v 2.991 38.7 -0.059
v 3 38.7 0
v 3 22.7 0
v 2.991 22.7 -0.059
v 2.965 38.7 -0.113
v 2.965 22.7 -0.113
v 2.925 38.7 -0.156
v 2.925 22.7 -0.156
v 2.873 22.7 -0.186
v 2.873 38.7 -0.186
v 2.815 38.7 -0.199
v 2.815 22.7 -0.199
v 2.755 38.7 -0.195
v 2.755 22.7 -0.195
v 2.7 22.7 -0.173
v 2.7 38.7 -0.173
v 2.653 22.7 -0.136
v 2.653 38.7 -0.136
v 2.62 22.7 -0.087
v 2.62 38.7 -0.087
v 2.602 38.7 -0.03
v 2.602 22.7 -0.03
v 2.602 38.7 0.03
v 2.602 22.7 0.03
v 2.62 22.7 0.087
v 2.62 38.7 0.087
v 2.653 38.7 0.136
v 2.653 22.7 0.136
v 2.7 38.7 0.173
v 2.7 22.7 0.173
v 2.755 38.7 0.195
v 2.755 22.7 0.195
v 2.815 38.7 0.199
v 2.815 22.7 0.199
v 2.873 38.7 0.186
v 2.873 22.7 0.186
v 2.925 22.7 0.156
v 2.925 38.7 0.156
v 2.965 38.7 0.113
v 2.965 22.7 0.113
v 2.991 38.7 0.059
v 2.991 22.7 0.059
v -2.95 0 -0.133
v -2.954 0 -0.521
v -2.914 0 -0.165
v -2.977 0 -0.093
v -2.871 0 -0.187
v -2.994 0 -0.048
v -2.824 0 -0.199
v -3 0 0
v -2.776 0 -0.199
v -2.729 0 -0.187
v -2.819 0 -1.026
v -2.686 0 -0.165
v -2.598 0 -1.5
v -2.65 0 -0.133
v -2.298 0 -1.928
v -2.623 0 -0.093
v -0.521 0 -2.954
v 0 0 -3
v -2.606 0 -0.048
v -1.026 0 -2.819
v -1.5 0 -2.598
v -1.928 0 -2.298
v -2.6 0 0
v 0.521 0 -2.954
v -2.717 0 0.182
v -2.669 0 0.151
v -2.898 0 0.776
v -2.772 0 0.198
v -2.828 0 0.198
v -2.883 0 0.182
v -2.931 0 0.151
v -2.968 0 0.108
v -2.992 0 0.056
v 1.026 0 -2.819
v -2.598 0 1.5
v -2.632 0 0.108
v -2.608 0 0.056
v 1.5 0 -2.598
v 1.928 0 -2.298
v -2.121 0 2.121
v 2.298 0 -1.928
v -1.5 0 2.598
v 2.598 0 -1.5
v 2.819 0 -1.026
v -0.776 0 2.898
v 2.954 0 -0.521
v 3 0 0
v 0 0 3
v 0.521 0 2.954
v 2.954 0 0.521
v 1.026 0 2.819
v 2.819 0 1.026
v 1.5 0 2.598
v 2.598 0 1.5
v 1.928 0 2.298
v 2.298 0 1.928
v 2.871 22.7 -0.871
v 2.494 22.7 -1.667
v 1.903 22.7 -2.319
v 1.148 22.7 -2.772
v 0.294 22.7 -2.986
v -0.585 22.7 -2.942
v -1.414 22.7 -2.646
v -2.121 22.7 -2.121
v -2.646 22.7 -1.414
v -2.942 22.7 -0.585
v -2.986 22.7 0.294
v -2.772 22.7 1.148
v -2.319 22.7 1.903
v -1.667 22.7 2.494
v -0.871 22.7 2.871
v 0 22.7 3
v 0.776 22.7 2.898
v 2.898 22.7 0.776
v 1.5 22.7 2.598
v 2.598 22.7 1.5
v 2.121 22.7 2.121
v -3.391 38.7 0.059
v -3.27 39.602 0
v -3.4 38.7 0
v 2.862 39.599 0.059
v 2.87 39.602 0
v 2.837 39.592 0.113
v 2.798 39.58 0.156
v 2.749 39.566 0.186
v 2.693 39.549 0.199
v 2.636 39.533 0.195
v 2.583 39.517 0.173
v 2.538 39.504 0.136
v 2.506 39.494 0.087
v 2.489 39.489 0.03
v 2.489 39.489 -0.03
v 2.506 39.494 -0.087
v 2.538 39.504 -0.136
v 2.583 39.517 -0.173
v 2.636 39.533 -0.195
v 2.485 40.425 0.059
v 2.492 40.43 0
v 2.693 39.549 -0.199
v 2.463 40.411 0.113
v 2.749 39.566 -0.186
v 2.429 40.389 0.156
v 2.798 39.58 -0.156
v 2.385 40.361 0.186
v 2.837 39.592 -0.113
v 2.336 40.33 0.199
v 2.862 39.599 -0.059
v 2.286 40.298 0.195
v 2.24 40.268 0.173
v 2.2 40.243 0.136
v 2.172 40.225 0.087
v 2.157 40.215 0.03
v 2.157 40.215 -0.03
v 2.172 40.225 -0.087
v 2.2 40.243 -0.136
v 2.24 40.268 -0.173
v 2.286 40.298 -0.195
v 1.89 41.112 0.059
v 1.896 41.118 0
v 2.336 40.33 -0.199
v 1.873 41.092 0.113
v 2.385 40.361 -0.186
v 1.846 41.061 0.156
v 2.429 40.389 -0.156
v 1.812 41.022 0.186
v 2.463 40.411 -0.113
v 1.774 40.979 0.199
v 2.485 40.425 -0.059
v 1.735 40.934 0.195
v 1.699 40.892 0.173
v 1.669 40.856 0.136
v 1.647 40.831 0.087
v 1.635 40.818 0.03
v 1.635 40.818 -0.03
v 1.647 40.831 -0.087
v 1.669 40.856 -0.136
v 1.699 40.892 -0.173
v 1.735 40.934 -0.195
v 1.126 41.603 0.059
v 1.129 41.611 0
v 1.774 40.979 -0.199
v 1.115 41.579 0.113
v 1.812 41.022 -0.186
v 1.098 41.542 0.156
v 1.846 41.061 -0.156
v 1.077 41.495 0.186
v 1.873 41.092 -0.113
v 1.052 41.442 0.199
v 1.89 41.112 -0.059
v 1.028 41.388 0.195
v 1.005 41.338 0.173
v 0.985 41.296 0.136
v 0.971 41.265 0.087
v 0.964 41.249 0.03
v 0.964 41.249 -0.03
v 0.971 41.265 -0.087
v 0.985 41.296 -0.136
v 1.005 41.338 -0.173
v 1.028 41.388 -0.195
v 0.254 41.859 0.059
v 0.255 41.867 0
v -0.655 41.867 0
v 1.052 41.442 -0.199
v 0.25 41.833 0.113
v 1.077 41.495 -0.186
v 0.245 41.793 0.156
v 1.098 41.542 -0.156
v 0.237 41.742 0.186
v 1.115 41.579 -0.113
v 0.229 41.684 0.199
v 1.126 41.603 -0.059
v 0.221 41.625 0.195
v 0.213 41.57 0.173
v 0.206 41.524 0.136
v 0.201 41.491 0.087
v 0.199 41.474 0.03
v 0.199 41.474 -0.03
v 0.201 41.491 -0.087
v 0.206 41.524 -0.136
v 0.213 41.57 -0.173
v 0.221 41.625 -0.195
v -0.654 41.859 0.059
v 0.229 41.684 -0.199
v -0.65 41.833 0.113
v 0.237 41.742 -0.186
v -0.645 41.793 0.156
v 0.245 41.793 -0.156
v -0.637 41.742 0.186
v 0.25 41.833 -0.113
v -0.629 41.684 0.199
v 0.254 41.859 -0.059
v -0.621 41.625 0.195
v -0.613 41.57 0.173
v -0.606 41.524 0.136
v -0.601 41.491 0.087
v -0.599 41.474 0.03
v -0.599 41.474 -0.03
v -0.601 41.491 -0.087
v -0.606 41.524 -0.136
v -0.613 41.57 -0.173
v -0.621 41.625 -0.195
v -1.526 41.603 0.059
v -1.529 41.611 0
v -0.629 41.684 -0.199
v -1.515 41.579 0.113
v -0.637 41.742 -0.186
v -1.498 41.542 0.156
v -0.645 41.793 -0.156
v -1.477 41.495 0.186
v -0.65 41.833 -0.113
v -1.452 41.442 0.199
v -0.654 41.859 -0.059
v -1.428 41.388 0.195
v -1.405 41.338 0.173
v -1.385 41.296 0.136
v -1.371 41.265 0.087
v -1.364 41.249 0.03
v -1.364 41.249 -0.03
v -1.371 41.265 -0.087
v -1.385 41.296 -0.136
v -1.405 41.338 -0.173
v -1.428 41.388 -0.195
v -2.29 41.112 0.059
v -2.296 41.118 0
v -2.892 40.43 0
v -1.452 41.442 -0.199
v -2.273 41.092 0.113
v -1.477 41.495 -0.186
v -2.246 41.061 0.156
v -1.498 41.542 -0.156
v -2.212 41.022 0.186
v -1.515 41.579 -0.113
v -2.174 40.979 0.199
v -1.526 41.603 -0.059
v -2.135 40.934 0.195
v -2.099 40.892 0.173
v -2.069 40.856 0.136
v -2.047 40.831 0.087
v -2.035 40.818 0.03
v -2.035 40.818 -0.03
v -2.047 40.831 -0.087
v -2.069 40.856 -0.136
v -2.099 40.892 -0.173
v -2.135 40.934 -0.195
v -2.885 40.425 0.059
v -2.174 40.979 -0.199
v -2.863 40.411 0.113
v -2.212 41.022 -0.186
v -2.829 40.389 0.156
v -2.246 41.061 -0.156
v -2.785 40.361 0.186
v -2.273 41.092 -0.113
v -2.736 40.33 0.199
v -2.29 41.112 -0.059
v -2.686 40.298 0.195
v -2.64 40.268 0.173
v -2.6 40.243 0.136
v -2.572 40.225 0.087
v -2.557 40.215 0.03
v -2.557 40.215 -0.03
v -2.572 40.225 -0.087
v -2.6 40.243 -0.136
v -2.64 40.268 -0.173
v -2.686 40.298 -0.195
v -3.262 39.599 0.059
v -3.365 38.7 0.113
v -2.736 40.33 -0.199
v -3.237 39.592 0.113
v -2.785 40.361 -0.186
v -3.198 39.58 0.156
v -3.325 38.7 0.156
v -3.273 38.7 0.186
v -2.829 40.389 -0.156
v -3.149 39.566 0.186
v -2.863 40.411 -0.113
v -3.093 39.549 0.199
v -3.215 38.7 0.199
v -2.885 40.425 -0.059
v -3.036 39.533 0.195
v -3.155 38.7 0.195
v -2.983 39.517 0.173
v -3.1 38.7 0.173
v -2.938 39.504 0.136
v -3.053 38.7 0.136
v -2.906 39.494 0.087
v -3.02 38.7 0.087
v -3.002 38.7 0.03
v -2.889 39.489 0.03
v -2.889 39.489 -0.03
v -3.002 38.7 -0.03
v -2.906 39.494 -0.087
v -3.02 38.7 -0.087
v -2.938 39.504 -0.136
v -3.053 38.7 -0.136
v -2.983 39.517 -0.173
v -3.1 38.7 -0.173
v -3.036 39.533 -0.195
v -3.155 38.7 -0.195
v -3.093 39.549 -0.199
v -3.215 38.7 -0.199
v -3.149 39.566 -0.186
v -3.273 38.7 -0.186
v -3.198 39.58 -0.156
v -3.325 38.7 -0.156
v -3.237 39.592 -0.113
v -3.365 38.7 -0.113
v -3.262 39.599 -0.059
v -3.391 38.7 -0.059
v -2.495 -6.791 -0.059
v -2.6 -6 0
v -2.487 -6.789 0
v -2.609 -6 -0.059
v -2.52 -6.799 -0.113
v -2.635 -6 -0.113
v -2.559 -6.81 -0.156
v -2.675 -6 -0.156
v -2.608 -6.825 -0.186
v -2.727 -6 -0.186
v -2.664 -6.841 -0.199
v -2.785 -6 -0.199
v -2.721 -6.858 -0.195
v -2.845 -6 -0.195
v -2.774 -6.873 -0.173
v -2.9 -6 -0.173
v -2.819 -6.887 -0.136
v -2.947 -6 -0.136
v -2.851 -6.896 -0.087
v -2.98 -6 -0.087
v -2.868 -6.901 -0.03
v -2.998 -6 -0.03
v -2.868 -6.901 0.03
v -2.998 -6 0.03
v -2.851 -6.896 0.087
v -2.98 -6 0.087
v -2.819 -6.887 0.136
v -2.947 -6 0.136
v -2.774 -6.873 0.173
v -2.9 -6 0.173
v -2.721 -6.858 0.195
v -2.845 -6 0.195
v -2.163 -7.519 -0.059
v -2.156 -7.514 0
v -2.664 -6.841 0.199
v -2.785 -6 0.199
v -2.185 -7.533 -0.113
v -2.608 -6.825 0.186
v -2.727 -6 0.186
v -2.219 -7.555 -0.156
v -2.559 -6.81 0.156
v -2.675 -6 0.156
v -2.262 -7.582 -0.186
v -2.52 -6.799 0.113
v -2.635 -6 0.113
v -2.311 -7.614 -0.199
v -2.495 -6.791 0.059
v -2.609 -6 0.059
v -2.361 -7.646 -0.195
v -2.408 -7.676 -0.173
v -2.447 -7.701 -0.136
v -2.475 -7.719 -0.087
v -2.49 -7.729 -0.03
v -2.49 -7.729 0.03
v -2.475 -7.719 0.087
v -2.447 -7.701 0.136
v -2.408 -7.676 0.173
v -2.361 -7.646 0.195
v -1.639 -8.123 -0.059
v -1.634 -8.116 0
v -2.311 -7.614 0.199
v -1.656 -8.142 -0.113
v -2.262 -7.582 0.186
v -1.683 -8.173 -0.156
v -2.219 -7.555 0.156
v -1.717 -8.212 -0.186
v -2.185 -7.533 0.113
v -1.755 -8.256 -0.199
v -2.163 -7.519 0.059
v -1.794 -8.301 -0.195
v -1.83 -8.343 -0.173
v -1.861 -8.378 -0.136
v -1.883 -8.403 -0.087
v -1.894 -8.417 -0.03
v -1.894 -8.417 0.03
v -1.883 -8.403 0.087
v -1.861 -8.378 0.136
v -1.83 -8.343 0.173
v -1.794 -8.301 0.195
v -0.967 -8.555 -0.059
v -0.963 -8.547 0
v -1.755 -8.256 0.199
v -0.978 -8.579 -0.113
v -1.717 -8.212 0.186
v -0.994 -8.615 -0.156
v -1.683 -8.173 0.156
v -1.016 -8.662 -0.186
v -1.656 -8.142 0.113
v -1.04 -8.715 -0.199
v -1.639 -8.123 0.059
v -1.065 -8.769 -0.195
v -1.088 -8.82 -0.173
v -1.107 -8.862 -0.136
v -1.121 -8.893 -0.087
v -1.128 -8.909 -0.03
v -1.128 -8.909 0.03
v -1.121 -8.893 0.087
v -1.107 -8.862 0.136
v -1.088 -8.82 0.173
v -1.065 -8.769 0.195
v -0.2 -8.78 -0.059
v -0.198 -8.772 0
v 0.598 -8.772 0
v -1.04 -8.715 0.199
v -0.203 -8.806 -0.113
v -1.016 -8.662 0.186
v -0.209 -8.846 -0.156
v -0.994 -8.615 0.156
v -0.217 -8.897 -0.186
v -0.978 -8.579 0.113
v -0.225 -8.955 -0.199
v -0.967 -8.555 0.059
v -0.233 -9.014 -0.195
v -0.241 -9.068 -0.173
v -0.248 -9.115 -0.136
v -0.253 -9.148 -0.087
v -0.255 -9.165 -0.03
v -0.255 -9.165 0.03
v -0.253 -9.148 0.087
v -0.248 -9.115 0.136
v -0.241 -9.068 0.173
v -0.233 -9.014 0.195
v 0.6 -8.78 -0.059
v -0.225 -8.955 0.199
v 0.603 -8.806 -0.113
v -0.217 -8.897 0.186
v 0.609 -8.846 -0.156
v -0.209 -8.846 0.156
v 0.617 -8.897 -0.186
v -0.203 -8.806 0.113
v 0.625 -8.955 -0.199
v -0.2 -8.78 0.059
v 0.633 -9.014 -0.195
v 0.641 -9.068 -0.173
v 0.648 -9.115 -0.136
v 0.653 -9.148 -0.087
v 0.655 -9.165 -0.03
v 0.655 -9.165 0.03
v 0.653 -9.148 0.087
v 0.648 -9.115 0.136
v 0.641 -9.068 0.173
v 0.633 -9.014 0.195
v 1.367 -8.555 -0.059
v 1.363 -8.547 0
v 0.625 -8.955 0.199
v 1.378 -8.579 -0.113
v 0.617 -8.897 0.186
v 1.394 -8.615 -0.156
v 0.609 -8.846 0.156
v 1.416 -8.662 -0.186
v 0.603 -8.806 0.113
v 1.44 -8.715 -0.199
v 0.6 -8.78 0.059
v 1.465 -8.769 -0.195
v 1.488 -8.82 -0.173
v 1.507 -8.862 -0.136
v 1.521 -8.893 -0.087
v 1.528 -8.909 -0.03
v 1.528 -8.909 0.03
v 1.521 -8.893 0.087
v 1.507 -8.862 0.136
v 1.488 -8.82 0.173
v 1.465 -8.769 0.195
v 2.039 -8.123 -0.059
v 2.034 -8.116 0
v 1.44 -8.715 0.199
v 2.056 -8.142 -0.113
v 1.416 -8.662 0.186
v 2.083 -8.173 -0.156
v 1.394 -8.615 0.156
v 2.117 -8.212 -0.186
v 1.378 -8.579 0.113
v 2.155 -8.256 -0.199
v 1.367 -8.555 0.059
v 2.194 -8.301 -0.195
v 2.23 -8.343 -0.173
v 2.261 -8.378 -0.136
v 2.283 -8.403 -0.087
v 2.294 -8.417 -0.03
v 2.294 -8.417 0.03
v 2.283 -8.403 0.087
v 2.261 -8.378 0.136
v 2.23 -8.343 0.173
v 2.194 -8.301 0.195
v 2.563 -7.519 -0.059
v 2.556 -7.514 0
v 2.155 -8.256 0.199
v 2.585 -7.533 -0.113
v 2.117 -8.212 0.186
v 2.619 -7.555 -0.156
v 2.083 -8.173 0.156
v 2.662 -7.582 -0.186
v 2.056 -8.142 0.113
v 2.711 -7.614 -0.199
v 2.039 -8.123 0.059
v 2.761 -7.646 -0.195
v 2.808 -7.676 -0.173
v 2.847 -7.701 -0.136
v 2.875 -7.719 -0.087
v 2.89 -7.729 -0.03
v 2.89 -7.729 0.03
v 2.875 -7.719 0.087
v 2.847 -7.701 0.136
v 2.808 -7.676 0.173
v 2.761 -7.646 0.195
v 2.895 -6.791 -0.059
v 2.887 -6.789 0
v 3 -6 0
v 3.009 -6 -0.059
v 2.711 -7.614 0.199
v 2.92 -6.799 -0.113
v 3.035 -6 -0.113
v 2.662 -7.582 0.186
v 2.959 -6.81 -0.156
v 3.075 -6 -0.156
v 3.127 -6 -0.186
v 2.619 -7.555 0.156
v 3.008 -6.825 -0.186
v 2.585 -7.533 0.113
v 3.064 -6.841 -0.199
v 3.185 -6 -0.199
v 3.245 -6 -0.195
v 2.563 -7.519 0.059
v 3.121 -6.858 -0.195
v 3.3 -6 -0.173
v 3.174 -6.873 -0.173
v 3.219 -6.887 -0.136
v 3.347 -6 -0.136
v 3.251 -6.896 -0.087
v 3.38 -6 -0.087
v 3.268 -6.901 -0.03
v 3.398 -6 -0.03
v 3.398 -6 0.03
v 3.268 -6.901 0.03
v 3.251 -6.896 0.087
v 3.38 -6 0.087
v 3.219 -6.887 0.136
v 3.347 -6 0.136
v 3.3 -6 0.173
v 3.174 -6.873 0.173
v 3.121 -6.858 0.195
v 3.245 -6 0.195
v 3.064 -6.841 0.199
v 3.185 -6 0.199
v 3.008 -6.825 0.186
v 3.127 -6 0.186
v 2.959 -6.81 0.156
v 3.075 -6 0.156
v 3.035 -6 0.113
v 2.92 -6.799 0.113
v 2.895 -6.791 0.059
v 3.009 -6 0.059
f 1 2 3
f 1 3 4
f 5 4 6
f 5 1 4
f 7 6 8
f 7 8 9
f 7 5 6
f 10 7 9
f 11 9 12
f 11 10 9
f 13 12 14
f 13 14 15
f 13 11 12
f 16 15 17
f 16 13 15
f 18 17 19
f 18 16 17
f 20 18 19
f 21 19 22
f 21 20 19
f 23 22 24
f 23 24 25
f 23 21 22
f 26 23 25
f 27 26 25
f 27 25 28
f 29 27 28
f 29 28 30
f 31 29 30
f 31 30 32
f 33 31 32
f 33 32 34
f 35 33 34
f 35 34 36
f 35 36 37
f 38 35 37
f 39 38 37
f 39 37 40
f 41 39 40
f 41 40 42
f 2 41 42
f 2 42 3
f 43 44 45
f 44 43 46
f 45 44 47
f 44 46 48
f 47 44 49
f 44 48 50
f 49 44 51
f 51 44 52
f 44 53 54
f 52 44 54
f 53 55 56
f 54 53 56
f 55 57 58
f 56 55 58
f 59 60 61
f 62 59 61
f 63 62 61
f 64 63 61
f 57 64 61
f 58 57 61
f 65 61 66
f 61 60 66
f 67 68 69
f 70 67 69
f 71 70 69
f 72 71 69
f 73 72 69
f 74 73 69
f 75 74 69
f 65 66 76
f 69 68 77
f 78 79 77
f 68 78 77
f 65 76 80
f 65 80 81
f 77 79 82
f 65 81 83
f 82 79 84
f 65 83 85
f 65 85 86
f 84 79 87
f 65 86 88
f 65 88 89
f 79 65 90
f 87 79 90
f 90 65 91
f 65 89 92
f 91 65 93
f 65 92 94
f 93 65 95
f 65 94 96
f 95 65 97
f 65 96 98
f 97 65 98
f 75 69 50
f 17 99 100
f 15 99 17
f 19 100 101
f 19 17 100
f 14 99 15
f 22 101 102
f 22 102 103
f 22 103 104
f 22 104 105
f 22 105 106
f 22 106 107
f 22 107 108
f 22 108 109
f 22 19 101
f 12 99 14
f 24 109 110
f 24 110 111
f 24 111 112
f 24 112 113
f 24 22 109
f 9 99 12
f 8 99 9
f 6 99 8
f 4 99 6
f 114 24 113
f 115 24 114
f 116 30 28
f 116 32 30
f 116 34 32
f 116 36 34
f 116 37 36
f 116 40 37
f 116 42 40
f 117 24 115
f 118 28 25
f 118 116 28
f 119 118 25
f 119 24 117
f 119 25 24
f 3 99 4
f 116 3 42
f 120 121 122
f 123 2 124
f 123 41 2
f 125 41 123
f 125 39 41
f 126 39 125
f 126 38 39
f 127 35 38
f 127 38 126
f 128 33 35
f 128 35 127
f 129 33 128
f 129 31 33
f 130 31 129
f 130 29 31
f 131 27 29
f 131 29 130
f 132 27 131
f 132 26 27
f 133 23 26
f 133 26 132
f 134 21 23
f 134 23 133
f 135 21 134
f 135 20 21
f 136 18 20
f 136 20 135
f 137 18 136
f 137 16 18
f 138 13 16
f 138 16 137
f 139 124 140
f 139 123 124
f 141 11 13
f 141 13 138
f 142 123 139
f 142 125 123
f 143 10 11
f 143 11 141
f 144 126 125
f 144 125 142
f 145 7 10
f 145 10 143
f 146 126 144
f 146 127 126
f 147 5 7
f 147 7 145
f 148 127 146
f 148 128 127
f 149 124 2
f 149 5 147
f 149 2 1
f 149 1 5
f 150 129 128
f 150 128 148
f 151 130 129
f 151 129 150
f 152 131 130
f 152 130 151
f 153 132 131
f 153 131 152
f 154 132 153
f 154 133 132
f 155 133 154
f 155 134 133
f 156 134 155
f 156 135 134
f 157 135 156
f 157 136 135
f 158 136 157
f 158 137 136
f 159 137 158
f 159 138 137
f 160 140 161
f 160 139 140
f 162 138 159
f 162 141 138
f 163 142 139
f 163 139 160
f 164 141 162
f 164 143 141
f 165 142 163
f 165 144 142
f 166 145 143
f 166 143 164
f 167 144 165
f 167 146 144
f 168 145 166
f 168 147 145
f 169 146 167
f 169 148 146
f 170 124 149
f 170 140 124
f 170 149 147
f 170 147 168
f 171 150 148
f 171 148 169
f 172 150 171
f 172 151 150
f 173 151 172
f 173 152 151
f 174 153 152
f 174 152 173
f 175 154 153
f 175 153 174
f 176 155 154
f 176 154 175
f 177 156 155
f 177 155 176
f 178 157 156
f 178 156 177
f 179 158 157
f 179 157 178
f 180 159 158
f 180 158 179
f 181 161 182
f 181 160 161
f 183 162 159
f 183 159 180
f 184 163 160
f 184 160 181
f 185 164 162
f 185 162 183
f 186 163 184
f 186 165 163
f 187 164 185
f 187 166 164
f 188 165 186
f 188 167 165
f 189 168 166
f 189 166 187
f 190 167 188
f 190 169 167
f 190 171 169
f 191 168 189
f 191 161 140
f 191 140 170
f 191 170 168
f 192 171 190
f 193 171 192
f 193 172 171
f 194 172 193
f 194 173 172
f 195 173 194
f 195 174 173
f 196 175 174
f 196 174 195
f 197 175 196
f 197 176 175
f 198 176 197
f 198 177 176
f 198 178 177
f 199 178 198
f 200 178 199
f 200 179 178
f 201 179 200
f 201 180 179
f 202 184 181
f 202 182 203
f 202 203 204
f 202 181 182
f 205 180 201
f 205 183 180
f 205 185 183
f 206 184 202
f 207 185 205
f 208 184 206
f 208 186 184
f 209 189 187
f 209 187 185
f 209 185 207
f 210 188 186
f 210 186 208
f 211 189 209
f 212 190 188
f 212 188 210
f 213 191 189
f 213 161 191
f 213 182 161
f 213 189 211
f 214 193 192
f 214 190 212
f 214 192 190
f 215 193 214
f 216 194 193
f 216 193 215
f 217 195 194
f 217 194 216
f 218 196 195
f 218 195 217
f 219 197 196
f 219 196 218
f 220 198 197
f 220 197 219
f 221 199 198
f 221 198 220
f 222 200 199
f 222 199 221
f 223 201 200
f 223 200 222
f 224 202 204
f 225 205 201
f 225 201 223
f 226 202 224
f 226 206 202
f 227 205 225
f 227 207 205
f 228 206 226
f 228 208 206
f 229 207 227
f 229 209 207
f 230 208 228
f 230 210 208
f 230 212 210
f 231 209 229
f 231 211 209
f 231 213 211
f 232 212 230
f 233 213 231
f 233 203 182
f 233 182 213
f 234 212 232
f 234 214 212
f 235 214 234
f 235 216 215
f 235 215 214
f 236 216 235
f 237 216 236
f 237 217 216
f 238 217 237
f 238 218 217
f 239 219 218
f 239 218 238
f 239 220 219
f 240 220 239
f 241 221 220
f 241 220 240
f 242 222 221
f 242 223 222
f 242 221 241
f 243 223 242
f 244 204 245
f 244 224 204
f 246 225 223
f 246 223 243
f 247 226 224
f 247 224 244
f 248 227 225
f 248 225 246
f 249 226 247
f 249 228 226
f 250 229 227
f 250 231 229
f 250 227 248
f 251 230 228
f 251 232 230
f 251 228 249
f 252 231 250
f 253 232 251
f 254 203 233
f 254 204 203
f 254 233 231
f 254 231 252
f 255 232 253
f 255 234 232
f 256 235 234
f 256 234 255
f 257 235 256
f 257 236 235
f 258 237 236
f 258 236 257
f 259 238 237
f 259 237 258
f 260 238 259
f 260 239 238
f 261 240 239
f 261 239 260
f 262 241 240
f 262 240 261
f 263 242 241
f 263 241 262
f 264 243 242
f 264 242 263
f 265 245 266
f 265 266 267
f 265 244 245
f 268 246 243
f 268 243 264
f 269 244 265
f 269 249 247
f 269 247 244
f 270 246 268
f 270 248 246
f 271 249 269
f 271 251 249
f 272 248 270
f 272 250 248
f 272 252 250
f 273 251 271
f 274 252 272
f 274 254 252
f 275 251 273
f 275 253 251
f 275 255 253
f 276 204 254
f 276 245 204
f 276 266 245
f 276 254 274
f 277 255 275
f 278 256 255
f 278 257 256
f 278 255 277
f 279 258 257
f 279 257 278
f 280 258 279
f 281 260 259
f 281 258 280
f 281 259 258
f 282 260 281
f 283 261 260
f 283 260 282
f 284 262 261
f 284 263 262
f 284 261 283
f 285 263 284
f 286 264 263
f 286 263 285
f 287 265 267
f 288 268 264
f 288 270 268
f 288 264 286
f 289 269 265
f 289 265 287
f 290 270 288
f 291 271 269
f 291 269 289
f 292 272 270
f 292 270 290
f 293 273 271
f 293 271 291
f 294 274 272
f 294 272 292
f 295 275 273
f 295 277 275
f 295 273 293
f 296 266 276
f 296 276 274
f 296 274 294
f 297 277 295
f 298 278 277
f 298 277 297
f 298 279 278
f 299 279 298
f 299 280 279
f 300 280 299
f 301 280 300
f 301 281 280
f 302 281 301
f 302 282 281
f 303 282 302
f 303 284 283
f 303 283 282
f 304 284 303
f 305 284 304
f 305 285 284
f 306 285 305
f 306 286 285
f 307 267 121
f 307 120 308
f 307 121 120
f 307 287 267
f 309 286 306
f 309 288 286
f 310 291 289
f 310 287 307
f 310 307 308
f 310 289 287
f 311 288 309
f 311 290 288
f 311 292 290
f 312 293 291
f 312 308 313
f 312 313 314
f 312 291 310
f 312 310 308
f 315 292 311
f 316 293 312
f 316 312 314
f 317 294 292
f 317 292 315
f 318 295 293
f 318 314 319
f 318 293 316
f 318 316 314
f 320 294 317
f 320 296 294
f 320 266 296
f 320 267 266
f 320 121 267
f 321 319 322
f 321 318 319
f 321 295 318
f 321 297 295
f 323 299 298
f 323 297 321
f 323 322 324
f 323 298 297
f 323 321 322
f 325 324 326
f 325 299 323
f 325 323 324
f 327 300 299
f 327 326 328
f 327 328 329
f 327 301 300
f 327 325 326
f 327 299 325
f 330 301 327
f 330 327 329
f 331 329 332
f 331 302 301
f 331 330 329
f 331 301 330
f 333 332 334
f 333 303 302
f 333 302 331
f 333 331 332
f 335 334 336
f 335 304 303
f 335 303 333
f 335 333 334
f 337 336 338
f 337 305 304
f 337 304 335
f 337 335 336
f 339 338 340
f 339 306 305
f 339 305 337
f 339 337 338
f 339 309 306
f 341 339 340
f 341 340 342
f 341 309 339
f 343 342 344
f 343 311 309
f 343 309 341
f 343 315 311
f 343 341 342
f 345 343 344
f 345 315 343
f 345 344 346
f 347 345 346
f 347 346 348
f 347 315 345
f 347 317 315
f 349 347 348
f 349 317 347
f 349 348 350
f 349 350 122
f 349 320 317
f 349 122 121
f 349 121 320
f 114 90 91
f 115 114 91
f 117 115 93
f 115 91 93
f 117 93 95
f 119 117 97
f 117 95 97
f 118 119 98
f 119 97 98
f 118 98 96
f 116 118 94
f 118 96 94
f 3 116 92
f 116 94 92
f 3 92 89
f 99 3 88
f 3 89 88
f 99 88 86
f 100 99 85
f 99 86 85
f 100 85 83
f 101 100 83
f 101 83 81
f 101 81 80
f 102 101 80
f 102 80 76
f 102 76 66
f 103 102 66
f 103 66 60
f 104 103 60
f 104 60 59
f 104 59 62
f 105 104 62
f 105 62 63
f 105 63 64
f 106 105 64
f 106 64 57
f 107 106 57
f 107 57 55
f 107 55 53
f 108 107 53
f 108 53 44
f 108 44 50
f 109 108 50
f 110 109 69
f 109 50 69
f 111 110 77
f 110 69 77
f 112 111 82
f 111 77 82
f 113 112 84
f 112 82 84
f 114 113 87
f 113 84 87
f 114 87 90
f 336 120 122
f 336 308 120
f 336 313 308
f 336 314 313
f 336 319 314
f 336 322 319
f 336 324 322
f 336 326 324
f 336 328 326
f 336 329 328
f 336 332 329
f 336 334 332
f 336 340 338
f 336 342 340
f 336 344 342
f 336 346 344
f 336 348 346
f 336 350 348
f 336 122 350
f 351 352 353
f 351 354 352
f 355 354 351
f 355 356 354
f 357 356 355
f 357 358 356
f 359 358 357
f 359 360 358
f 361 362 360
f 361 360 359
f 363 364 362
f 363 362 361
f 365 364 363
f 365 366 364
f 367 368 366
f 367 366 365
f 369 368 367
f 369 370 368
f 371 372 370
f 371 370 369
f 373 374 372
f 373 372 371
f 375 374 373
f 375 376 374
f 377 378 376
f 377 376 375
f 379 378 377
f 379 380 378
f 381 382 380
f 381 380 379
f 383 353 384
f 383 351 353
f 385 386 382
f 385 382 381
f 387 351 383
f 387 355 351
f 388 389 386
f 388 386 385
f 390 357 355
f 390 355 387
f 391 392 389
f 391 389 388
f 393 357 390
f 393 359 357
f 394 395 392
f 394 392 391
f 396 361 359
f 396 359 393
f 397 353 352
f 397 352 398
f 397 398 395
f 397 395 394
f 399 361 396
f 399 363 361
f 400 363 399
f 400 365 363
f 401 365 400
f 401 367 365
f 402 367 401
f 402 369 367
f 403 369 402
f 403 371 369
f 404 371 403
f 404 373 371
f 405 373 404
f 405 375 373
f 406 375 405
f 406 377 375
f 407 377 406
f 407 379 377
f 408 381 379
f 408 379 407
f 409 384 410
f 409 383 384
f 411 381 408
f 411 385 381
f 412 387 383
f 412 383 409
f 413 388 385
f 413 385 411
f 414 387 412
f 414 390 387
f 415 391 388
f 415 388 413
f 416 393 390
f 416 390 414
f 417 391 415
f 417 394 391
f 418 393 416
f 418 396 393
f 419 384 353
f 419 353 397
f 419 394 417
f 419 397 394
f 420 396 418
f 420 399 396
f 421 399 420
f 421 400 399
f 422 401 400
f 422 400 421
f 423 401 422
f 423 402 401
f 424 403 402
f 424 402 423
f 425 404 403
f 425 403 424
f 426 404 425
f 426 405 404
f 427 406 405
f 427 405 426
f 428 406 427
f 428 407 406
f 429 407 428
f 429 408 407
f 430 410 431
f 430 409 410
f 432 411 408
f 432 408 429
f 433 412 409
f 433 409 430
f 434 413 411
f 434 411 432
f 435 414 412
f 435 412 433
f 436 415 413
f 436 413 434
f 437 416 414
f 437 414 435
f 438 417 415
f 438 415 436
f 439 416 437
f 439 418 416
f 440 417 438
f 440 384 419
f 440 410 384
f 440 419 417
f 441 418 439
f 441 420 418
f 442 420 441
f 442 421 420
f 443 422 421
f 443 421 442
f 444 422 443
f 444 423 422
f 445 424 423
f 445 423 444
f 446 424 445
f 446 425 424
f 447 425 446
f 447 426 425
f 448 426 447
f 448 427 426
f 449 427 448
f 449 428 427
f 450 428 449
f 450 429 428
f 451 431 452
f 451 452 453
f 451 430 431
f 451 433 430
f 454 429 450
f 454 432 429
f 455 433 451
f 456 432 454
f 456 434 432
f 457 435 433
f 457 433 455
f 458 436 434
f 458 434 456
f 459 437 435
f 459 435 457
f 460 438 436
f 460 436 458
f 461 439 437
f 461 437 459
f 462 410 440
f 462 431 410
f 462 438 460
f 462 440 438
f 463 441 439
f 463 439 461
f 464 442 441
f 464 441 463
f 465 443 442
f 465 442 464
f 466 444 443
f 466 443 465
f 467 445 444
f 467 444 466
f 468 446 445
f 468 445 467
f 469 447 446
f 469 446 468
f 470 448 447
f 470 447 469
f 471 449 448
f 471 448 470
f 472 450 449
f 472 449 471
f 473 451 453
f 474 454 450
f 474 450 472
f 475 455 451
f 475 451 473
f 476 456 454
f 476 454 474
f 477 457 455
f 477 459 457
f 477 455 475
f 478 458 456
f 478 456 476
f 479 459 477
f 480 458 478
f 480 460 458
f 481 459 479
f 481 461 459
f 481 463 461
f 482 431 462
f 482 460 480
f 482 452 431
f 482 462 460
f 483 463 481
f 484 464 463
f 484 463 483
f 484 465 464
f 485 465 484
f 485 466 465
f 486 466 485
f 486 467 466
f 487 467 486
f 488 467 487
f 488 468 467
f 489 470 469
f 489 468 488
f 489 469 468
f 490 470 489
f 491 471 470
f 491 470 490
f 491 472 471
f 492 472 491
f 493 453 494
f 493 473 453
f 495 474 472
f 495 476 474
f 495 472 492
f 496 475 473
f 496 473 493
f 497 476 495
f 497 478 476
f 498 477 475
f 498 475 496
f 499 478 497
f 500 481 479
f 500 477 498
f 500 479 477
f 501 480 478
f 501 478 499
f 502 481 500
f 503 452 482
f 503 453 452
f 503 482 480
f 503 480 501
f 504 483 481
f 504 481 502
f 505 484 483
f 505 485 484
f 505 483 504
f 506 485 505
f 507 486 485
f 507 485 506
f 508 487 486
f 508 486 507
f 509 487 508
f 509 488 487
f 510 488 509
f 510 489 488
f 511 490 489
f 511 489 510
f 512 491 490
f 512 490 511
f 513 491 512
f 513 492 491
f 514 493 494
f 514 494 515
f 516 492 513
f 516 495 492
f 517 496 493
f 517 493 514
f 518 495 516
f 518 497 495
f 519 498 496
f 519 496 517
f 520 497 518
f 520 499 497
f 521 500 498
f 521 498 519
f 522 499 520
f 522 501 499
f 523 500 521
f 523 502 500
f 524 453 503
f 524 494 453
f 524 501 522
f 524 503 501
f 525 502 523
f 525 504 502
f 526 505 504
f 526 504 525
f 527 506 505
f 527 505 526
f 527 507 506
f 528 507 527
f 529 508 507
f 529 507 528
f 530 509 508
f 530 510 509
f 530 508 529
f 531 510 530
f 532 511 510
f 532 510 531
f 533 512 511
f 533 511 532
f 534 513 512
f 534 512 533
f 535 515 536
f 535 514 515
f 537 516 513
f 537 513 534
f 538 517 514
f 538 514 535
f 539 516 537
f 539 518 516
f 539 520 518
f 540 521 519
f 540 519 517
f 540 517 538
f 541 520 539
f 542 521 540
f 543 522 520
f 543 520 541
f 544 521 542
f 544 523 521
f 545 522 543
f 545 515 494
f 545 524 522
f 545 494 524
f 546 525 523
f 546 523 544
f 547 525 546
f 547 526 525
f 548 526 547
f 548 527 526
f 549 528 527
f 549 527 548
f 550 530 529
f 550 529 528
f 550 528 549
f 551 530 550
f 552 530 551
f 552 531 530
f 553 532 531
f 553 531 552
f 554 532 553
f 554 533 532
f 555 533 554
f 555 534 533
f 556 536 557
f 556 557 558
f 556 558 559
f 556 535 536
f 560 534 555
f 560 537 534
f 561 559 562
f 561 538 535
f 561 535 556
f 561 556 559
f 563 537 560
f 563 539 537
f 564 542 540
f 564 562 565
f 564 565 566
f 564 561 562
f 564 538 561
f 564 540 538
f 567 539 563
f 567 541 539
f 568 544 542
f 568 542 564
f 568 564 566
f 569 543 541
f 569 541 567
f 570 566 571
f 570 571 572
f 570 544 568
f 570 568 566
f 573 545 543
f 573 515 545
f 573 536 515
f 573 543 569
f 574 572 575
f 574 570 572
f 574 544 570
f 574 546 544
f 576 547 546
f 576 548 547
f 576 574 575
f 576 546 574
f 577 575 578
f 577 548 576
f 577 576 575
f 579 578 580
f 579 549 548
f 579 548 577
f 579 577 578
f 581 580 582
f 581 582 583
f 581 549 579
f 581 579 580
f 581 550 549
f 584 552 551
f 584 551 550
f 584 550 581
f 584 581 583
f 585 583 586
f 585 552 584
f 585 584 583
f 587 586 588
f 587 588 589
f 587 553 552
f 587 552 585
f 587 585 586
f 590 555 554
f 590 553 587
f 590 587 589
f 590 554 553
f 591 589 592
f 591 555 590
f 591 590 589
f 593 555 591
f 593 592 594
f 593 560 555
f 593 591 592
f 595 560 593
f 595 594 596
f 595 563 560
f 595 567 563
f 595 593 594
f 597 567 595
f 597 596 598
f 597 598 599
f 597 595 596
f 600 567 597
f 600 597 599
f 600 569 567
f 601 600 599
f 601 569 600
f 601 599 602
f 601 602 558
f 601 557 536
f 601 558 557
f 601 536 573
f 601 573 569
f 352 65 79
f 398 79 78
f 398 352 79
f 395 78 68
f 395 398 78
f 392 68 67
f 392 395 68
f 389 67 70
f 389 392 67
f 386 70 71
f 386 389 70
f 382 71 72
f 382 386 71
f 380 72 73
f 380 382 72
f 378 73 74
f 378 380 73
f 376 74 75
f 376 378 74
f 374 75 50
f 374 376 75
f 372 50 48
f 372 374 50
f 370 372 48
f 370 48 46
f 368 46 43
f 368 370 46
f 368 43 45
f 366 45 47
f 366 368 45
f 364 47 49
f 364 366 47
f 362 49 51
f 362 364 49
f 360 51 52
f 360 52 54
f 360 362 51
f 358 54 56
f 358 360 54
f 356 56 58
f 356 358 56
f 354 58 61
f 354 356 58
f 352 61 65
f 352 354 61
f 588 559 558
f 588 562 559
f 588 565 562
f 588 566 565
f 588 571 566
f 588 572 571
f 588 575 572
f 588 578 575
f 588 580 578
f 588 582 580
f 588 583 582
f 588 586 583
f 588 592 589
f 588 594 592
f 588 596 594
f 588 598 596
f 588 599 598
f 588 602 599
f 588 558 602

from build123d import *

# Parameters (mm, degrees)
SKETCH1_R           = 3
BOSS_EXTRUDE1_DEPTH = 22.7
SKETCH3_R           = 0.2
SKETCH5_R           = 0.2


with BuildPart() as part:
    # Sketch1 → Boss-Extrude1 (new body)
    with BuildSketch(Plane(origin=(0, 0, 0), x_dir=(1, 0, 0), z_dir=(0, 1, 0))):
        with Locations(Location((0, 0, 0), (0, 0, 270))):
            Circle(SKETCH1_R)
    extrude(amount=BOSS_EXTRUDE1_DEPTH)

    # Sweep1: sweep along a path in Sketch2
    with BuildLine(Plane.XY) as sweep1_path:
        Line((2.8, 22.7), (2.8, 38.7))
        ThreePointArc((2.8, 38.7), (-0.2, 41.7), (-3.2, 38.7))
    # Sketch3 → Sweep1 (sweep)
    with BuildSketch(Plane(origin=(0, 22.7, 0), x_dir=(1, 0, 0), z_dir=(0, 1, 0))):
        with Locations((2.8, 0)):
            Circle(SKETCH3_R)
    sweep(path=sweep1_path.line)

    # Sweep2: sweep along a path in Sketch4
    with BuildLine(Plane.XY) as sweep2_path:
        Line((-2.8, 0), (-2.8, -6))
        ThreePointArc((-2.8, -6), (0.2, -9), (3.2, -6))
    # Sketch5 → Sweep2 (sweep)
    with BuildSketch(Plane.XZ):
        with Locations((-2.8, 0)):
            Circle(SKETCH5_R)
    sweep(path=sweep2_path.line)


solid = part.part
